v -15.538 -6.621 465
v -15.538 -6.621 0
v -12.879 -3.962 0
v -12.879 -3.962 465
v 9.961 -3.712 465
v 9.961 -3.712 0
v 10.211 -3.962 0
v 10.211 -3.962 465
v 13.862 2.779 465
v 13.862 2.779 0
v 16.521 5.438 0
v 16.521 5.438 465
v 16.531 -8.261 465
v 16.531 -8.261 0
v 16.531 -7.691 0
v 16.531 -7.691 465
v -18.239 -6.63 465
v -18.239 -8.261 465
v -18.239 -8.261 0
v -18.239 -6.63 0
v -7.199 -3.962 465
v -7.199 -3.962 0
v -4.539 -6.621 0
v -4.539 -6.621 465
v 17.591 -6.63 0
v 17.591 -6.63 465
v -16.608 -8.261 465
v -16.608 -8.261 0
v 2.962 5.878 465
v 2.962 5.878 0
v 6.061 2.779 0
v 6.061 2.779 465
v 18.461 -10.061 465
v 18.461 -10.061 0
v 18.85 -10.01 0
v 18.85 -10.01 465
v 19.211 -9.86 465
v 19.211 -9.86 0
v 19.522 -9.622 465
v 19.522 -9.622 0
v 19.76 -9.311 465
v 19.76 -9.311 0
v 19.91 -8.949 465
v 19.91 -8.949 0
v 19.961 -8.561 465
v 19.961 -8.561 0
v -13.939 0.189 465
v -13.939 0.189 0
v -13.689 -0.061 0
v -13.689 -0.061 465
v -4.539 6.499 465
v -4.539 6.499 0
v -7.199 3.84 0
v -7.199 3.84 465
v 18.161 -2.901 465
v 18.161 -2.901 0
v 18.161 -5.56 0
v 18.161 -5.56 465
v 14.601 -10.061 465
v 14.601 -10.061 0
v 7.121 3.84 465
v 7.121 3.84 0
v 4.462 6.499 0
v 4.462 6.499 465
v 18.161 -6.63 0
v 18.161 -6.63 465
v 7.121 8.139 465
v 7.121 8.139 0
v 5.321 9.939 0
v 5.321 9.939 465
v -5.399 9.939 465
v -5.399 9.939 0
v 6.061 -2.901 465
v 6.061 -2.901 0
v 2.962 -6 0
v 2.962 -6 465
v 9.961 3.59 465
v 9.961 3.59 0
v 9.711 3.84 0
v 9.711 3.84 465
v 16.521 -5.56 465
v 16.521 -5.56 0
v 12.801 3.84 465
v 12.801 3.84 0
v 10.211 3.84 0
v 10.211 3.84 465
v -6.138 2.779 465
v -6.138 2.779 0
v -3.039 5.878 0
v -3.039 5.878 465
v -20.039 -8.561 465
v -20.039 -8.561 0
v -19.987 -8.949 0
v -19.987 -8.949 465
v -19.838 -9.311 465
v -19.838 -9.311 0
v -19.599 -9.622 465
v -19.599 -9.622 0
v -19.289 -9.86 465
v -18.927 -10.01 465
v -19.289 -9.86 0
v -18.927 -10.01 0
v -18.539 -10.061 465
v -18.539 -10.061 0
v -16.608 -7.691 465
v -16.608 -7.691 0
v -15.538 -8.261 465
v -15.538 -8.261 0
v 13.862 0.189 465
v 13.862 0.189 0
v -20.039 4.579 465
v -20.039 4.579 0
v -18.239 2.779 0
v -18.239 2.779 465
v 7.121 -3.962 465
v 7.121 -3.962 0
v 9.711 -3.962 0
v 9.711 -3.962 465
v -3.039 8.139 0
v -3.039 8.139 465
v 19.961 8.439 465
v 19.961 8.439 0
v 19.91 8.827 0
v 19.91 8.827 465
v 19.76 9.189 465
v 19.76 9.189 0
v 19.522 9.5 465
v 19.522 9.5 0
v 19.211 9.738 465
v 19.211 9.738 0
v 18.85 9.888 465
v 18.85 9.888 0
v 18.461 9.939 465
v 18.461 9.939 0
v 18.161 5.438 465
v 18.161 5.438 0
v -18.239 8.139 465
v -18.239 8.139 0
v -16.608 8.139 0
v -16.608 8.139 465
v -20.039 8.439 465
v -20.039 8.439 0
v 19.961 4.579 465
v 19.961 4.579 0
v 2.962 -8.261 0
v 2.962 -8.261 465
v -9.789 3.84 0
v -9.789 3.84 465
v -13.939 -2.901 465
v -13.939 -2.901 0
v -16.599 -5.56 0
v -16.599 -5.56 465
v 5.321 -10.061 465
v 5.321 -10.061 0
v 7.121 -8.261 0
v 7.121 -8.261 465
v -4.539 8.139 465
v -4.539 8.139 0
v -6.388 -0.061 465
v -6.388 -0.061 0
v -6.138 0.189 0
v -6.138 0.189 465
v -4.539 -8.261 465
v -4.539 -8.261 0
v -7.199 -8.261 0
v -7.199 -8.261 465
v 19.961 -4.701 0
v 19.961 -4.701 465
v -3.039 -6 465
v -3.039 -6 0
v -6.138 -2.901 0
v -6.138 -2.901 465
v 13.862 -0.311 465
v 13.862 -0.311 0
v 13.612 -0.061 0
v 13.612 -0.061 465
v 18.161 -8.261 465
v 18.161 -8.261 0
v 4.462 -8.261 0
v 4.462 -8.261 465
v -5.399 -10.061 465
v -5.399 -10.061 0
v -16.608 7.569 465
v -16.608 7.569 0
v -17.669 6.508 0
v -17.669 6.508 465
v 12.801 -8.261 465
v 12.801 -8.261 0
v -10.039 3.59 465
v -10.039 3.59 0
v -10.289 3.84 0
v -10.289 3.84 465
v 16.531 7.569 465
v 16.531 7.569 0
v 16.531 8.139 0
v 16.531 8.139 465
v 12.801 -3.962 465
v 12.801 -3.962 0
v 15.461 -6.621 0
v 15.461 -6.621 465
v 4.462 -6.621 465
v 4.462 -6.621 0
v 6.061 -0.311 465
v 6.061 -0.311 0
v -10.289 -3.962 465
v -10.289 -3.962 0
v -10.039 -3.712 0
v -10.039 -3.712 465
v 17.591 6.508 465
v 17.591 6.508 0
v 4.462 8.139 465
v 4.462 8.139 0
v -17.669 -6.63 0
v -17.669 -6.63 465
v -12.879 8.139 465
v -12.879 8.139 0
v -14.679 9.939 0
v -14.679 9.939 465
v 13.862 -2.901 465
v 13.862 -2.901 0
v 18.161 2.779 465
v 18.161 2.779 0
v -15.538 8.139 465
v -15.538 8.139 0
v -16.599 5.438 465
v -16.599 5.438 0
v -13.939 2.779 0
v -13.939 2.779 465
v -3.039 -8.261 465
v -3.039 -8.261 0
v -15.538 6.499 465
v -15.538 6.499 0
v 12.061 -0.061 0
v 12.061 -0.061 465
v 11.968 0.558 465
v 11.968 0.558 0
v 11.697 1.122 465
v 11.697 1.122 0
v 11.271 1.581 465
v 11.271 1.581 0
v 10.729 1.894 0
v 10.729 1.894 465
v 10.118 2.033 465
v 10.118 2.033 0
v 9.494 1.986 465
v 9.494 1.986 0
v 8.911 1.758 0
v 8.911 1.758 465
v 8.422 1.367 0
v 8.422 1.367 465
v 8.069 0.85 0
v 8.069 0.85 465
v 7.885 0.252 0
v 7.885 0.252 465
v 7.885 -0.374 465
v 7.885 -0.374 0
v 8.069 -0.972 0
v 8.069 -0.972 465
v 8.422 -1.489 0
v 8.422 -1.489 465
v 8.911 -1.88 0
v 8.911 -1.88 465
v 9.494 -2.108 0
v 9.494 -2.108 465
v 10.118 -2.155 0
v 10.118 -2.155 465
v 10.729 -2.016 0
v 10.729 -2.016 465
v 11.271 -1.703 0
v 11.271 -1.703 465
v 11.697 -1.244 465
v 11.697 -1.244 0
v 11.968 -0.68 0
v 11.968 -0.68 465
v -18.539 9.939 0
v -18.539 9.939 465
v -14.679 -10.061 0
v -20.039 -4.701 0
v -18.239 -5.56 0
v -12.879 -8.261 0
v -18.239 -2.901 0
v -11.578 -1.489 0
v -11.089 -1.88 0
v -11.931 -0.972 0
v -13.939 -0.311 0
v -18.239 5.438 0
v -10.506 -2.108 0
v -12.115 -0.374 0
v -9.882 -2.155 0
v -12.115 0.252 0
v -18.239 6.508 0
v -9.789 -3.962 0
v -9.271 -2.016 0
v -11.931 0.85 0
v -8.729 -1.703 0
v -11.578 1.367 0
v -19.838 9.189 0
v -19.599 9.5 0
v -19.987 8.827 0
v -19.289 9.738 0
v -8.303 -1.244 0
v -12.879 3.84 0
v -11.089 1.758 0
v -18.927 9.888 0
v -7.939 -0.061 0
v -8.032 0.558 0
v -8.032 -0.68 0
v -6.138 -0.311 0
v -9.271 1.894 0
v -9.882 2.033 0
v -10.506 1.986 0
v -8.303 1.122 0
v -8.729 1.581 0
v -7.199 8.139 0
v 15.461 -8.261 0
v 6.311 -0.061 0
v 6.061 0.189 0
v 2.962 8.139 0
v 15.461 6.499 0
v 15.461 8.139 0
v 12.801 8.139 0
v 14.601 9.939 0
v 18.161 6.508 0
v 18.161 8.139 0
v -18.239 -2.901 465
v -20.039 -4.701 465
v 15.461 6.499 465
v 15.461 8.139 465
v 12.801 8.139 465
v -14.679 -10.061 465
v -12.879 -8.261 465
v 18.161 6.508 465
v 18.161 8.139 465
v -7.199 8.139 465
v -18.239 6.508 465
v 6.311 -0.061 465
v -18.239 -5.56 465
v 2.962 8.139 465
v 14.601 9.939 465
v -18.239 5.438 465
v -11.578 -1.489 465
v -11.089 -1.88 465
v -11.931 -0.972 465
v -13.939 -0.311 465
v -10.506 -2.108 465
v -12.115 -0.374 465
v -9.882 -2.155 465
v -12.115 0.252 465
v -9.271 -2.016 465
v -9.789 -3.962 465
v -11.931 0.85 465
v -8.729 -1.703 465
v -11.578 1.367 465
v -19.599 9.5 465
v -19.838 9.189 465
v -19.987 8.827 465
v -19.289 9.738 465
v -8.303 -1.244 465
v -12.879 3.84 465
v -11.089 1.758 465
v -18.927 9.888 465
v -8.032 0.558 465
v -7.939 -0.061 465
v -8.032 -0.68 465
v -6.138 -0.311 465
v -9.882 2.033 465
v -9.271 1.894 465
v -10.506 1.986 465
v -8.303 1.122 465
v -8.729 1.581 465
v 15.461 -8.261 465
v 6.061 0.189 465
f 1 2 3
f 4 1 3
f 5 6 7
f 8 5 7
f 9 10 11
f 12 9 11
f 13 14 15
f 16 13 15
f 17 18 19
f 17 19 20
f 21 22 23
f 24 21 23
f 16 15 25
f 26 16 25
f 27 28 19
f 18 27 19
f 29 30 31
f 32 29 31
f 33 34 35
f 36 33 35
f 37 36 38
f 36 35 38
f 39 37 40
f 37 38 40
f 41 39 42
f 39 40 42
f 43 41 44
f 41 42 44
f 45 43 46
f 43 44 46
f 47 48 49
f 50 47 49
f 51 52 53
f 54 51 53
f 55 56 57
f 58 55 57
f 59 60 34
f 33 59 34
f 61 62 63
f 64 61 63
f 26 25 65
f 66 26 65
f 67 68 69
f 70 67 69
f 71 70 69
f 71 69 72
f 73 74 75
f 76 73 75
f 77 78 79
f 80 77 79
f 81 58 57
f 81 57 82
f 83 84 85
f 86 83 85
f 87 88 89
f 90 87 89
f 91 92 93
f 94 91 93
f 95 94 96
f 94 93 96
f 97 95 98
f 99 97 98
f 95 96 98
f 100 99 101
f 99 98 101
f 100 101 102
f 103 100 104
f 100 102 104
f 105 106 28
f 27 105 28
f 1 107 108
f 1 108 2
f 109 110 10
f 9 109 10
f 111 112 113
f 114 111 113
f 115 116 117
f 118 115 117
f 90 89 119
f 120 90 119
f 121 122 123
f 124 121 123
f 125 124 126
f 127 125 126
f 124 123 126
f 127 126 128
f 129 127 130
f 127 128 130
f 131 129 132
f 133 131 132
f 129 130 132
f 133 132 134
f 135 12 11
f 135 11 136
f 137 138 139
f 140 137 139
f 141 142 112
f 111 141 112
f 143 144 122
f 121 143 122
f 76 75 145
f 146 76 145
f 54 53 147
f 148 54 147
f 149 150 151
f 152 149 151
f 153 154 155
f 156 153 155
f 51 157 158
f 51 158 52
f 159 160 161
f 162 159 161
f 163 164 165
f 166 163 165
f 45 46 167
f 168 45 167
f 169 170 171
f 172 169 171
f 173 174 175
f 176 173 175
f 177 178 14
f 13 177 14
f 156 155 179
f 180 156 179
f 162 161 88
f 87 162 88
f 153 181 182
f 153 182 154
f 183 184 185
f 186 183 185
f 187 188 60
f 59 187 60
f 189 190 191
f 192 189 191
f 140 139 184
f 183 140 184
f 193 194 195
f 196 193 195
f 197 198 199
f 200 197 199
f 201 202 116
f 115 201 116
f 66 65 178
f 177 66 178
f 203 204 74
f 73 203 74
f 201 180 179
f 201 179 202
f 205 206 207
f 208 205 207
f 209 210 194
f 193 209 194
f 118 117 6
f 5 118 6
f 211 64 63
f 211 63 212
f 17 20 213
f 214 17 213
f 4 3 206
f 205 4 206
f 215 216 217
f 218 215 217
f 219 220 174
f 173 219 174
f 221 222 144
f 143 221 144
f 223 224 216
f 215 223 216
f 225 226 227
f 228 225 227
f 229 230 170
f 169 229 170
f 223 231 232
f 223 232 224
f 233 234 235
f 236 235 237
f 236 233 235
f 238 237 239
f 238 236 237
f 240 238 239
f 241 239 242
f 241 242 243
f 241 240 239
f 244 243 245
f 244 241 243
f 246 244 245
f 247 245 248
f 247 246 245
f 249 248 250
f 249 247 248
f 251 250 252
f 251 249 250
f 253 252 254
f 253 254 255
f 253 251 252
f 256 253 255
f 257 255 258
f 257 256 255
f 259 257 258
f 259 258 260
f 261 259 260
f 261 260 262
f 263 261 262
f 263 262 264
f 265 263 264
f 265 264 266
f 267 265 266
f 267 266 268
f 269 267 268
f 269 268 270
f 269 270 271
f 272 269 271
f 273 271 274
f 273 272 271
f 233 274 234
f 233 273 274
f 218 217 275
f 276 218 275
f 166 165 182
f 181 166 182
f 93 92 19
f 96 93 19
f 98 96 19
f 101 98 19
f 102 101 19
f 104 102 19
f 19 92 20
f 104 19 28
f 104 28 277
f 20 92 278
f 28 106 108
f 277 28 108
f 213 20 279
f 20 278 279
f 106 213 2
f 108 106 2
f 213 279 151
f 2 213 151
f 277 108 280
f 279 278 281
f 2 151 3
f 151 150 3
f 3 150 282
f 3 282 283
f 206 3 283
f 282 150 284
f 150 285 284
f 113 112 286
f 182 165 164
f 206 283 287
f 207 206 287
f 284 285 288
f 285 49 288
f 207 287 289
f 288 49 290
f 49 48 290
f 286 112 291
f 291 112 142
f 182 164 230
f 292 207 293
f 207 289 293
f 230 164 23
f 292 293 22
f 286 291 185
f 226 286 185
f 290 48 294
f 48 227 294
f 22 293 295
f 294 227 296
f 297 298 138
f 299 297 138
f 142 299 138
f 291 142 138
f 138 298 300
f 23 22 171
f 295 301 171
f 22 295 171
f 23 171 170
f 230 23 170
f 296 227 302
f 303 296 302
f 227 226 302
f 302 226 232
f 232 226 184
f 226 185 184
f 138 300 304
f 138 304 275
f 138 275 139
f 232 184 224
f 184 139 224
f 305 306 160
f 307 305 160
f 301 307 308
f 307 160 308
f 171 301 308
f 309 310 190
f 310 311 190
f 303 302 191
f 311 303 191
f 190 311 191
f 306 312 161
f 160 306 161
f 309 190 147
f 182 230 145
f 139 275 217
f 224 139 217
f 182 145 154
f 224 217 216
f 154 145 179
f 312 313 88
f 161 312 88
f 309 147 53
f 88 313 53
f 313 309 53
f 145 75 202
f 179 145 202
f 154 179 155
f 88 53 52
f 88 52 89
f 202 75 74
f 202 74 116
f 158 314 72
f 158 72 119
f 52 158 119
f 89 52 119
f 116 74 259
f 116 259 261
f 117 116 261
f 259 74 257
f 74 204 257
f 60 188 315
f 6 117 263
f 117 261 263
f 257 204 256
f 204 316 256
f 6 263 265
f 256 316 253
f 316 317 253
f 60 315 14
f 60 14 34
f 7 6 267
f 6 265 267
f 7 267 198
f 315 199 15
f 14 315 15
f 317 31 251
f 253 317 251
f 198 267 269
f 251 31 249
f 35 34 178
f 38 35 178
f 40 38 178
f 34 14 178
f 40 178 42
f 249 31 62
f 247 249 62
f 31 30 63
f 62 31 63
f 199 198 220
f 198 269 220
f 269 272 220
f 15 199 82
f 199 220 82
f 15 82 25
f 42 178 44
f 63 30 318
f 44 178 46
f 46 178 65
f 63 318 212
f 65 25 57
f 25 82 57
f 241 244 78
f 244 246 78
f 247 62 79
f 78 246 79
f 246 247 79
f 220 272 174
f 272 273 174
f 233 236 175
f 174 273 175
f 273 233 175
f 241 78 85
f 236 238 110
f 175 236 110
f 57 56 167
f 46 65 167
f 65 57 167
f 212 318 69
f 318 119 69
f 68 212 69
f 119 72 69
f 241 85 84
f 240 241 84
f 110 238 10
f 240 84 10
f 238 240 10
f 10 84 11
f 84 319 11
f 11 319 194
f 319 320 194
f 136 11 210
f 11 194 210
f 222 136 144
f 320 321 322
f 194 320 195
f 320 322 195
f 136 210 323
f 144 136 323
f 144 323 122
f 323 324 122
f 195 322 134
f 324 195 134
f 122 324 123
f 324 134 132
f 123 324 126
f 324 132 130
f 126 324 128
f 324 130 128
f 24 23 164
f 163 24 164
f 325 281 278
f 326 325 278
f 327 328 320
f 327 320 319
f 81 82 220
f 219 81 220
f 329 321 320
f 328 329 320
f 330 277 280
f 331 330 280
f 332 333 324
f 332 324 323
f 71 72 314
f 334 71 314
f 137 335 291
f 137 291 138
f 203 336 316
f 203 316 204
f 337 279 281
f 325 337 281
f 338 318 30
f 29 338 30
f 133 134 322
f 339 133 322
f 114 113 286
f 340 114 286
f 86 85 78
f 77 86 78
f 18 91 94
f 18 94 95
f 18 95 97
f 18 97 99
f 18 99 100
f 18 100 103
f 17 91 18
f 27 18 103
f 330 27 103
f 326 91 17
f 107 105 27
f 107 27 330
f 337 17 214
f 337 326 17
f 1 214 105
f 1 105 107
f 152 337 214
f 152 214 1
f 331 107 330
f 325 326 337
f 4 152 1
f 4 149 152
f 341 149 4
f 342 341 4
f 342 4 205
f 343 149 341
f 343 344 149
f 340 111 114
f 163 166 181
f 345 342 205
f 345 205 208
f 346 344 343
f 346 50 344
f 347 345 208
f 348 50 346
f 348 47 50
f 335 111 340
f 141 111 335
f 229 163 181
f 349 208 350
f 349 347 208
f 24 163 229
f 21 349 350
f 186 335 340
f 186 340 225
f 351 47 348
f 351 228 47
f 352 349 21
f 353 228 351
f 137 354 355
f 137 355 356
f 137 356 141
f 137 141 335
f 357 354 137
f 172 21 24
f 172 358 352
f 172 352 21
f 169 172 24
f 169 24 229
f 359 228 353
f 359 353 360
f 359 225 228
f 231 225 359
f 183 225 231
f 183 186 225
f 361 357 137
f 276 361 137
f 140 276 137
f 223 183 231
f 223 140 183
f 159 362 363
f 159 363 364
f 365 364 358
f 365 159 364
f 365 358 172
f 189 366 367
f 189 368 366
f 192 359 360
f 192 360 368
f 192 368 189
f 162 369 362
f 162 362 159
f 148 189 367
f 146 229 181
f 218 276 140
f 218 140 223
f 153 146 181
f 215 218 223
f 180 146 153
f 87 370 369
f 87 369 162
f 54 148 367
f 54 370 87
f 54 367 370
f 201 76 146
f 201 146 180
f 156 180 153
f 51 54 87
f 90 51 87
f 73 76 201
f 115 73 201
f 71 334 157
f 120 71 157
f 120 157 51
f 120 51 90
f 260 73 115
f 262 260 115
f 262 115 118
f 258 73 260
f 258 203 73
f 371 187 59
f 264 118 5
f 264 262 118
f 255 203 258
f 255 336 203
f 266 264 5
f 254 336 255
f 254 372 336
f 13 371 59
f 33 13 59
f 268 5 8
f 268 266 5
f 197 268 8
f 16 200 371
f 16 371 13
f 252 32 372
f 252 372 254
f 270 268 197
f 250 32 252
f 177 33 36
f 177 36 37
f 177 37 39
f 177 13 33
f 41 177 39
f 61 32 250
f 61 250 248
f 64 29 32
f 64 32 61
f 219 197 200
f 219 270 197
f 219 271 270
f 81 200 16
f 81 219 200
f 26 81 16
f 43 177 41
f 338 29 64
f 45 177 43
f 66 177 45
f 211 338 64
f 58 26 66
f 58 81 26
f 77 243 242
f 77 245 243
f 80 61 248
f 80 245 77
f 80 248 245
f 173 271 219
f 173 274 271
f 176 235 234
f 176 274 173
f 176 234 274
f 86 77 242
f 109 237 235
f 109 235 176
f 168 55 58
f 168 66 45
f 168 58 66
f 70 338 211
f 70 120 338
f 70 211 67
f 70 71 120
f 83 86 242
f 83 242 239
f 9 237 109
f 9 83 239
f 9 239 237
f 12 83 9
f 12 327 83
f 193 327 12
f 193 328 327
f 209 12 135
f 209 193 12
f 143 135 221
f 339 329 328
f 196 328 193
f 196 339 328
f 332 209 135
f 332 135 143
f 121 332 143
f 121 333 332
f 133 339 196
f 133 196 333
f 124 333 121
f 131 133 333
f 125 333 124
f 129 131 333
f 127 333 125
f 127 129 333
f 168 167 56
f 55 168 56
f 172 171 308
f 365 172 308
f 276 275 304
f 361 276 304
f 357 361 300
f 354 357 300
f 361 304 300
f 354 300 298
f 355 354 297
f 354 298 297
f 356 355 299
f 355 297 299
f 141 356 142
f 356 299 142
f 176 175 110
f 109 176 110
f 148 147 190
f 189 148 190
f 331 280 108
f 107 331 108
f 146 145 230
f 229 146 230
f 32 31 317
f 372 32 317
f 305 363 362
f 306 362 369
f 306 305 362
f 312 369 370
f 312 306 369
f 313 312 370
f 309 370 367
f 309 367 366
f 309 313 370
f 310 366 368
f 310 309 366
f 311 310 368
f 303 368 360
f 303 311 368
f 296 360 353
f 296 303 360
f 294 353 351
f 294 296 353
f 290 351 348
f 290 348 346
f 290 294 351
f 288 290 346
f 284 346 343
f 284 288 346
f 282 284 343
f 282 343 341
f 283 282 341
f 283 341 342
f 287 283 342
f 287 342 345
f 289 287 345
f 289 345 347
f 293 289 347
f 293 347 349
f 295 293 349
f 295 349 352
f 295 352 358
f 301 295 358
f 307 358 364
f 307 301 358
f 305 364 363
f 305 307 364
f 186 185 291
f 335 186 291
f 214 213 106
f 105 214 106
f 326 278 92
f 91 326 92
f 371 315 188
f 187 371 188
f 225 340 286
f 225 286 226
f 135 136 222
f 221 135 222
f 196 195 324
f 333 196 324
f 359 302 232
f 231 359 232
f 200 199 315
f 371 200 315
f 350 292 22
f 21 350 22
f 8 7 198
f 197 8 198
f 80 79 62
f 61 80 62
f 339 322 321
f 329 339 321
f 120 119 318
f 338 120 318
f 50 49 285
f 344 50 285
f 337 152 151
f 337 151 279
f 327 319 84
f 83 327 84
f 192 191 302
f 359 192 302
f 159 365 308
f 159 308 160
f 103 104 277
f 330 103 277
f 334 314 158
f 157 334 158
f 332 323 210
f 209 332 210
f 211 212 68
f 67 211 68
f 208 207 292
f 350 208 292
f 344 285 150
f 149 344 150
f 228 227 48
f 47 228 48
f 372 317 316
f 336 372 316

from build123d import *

# Parameters (mm, degrees)
F0_R     = 2.1
F1_DEPTH = 465


with BuildPart() as f1:
    # F0 (on Top) → F1 (new body)
    with BuildSketch(Plane.XY):
        with BuildLine():
            Line((-5.398544, -10.060897), (-1.538544, -10.060897))
            Line((-1.538544, -10.060897), (1.461456, -10.060897))
            Line((1.461456, -10.060897), (5.321456, -10.060897))
            Line((5.321456, -10.060897), (7.121456, -8.260897))
            Line((7.121456, -8.260897), (4.462116, -8.260897))
            Line((4.462116, -8.260897), (4.462116, -6.620897))
            Line((4.462116, -6.620897), (7.121456, -3.961557))
            Line((7.121456, -3.961557), (9.711456, -3.961557))
            Line((9.711456, -3.961557), (9.961456, -3.711557))
            Line((9.961456, -3.711557), (10.211456, -3.961557))
            Line((10.211456, -3.961557), (12.801456, -3.961557))
            Line((12.801456, -3.961557), (15.460796, -6.620897))
            Line((15.460796, -6.620897), (15.460796, -8.260897))
            Line((15.460796, -8.260897), (12.801456, -8.260897))
            Line((12.801456, -8.260897), (14.601456, -10.060897))
            Line((14.601456, -10.060897), (18.461456, -10.060897))
            ThreePointArc((18.461456, -10.060897), (19.522116, -9.621557), (19.961456, -8.560897))
            Line((19.961456, -8.560897), (19.961456, -4.700897))
            Line((19.961456, -4.700897), (18.161456, -2.900897))
            Line((18.161456, -2.900897), (18.161456, -5.560237))
            Line((18.161456, -5.560237), (16.521456, -5.560237))
            Line((16.521456, -5.560237), (13.862116, -2.900897))
            Line((13.862116, -2.900897), (13.862116, -0.310897))
            Line((13.862116, -0.310897), (13.612116, -0.060897))
            Line((13.612116, -0.060897), (13.862116, 0.189103))
            Line((13.862116, 0.189103), (13.862116, 2.779103))
            Line((13.862116, 2.779103), (16.521456, 5.438443))
            Line((16.521456, 5.438443), (18.161456, 5.438443))
            Line((18.161456, 5.438443), (18.161456, 2.779103))
            Line((18.161456, 2.779103), (19.961456, 4.579103))
            Line((19.961456, 4.579103), (19.961456, 8.439103))
            ThreePointArc((19.961456, 8.439103), (19.522116, 9.499763), (18.461456, 9.939103))
            Line((18.461456, 9.939103), (14.601456, 9.939103))
            Line((14.601456, 9.939103), (12.801456, 8.139103))
            Line((12.801456, 8.139103), (15.460796, 8.139103))
            Line((15.460796, 8.139103), (15.460796, 6.499103))
            Line((15.460796, 6.499103), (12.801456, 3.839763))
            Line((12.801456, 3.839763), (10.211456, 3.839763))
            Line((10.211456, 3.839763), (9.961456, 3.589763))
            Line((9.961456, 3.589763), (9.711456, 3.839763))
            Line((9.711456, 3.839763), (7.121456, 3.839763))
            Line((7.121456, 3.839763), (4.462116, 6.499103))
            Line((4.462116, 6.499103), (4.462116, 8.139103))
            Line((4.462116, 8.139103), (7.121456, 8.139103))
            Line((7.121456, 8.139103), (5.321456, 9.939103))
            Line((5.321456, 9.939103), (1.461456, 9.939103))
            Line((1.461456, 9.939103), (-1.538544, 9.939103))
            Line((-1.538544, 9.939103), (-5.398544, 9.939103))
            Line((-5.398544, 9.939103), (-7.198544, 8.139103))
            Line((-7.198544, 8.139103), (-4.539204, 8.139103))
            Line((-4.539204, 8.139103), (-4.539204, 6.499103))
            Line((-4.539204, 6.499103), (-7.198544, 3.839763))
            Line((-7.198544, 3.839763), (-9.788544, 3.839763))
            Line((-9.788544, 3.839763), (-10.038544, 3.589763))
            Line((-10.038544, 3.589763), (-10.288544, 3.839763))
            Line((-10.288544, 3.839763), (-12.878544, 3.839763))
            Line((-12.878544, 3.839763), (-15.537884, 6.499103))
            Line((-15.537884, 6.499103), (-15.537884, 8.139103))
            Line((-15.537884, 8.139103), (-12.878544, 8.139103))
            Line((-12.878544, 8.139103), (-14.678544, 9.939103))
            Line((-14.678544, 9.939103), (-18.538544, 9.939103))
            ThreePointArc((-18.538544, 9.939103), (-19.599204, 9.499763), (-20.038544, 8.439103))
            Line((-20.038544, 8.439103), (-20.038544, 4.579103))
            Line((-20.038544, 4.579103), (-18.238544, 2.779103))
            Line((-18.238544, 2.779103), (-18.238544, 5.438443))
            Line((-18.238544, 5.438443), (-16.598544, 5.438443))
            Line((-16.598544, 5.438443), (-13.939204, 2.779103))
            Line((-13.939204, 2.779103), (-13.939204, 0.189103))
            Line((-13.939204, 0.189103), (-13.689204, -0.060897))
            Line((-13.689204, -0.060897), (-13.939204, -0.310897))
            Line((-13.939204, -0.310897), (-13.939204, -2.900897))
            Line((-13.939204, -2.900897), (-16.598544, -5.560237))
            Line((-16.598544, -5.560237), (-18.238544, -5.560237))
            Line((-18.238544, -5.560237), (-18.238544, -2.900897))
            Line((-18.238544, -2.900897), (-20.038544, -4.700897))
            Line((-20.038544, -4.700897), (-20.038544, -8.560897))
            ThreePointArc((-20.038544, -8.560897), (-19.599204, -9.621557), (-18.538544, -10.060897))
            Line((-18.538544, -10.060897), (-14.678544, -10.060897))
            Line((-14.678544, -10.060897), (-12.878544, -8.260897))
            Line((-12.878544, -8.260897), (-15.537884, -8.260897))
            Line((-15.537884, -8.260897), (-15.537884, -6.620897))
            Line((-15.537884, -6.620897), (-12.878544, -3.961557))
            Line((-12.878544, -3.961557), (-10.288544, -3.961557))
            Line((-10.288544, -3.961557), (-10.038544, -3.711557))
            Line((-10.038544, -3.711557), (-9.788544, -3.961557))
            Line((-9.788544, -3.961557), (-7.198544, -3.961557))
            Line((-7.198544, -3.961557), (-4.539204, -6.620897))
            Line((-4.539204, -6.620897), (-4.539204, -8.260897))
            Line((-4.539204, -8.260897), (-7.198544, -8.260897))
            Line((-7.198544, -8.260897), (-5.398544, -10.060897))
        make_face()
        Polygon((-16.607884, -7.690897), (-16.607884, -8.260897), (-18.238544, -8.260897), (-18.238544, -6.630237), (-17.668544, -6.630237), align=None, mode=Mode.SUBTRACT)
        Polygon((17.591456, -6.630237), (18.161456, -6.630237), (18.161456, -8.260897), (16.530796, -8.260897), (16.530796, -7.690897), align=None, mode=Mode.SUBTRACT)
        with Locations((-10.038544, -0.060897)):
            Circle(F0_R, mode=Mode.SUBTRACT)
        Polygon((-17.668544, 6.508443), (-18.238544, 6.508443), (-18.238544, 8.139103), (-16.607884, 8.139103), (-16.607884, 7.569103), align=None, mode=Mode.SUBTRACT)
        Polygon((-6.137884, 2.779103), (-3.478544, 5.438443), (-3.039204, 5.877783), (-3.039204, 8.139103), (2.962116, 8.139103), (2.962116, 5.877783), (3.401456, 5.438443), (6.060796, 2.779103), (6.060796, 0.189103), (6.310796, -0.060897), (6.060796, -0.310897), (6.060796, -2.900897), (3.401456, -5.560237), (2.962116, -5.999577), (2.962116, -8.260897), (-3.039204, -8.260897), (-3.039204, -5.999577), (-3.478544, -5.560237), (-6.137884, -2.900897), (-6.137884, -0.310897), (-6.387884, -0.060897), (-6.137884, 0.189103), align=None, mode=Mode.SUBTRACT)
        with Locations((9.961456, -0.060897)):
            Circle(F0_R, mode=Mode.SUBTRACT)
        Polygon((18.161456, 8.139103), (18.161456, 6.508443), (17.591456, 6.508443), (16.530796, 7.569103), (16.530796, 8.139103), align=None, mode=Mode.SUBTRACT)
    extrude(amount=F1_DEPTH)


solid = f1.part
